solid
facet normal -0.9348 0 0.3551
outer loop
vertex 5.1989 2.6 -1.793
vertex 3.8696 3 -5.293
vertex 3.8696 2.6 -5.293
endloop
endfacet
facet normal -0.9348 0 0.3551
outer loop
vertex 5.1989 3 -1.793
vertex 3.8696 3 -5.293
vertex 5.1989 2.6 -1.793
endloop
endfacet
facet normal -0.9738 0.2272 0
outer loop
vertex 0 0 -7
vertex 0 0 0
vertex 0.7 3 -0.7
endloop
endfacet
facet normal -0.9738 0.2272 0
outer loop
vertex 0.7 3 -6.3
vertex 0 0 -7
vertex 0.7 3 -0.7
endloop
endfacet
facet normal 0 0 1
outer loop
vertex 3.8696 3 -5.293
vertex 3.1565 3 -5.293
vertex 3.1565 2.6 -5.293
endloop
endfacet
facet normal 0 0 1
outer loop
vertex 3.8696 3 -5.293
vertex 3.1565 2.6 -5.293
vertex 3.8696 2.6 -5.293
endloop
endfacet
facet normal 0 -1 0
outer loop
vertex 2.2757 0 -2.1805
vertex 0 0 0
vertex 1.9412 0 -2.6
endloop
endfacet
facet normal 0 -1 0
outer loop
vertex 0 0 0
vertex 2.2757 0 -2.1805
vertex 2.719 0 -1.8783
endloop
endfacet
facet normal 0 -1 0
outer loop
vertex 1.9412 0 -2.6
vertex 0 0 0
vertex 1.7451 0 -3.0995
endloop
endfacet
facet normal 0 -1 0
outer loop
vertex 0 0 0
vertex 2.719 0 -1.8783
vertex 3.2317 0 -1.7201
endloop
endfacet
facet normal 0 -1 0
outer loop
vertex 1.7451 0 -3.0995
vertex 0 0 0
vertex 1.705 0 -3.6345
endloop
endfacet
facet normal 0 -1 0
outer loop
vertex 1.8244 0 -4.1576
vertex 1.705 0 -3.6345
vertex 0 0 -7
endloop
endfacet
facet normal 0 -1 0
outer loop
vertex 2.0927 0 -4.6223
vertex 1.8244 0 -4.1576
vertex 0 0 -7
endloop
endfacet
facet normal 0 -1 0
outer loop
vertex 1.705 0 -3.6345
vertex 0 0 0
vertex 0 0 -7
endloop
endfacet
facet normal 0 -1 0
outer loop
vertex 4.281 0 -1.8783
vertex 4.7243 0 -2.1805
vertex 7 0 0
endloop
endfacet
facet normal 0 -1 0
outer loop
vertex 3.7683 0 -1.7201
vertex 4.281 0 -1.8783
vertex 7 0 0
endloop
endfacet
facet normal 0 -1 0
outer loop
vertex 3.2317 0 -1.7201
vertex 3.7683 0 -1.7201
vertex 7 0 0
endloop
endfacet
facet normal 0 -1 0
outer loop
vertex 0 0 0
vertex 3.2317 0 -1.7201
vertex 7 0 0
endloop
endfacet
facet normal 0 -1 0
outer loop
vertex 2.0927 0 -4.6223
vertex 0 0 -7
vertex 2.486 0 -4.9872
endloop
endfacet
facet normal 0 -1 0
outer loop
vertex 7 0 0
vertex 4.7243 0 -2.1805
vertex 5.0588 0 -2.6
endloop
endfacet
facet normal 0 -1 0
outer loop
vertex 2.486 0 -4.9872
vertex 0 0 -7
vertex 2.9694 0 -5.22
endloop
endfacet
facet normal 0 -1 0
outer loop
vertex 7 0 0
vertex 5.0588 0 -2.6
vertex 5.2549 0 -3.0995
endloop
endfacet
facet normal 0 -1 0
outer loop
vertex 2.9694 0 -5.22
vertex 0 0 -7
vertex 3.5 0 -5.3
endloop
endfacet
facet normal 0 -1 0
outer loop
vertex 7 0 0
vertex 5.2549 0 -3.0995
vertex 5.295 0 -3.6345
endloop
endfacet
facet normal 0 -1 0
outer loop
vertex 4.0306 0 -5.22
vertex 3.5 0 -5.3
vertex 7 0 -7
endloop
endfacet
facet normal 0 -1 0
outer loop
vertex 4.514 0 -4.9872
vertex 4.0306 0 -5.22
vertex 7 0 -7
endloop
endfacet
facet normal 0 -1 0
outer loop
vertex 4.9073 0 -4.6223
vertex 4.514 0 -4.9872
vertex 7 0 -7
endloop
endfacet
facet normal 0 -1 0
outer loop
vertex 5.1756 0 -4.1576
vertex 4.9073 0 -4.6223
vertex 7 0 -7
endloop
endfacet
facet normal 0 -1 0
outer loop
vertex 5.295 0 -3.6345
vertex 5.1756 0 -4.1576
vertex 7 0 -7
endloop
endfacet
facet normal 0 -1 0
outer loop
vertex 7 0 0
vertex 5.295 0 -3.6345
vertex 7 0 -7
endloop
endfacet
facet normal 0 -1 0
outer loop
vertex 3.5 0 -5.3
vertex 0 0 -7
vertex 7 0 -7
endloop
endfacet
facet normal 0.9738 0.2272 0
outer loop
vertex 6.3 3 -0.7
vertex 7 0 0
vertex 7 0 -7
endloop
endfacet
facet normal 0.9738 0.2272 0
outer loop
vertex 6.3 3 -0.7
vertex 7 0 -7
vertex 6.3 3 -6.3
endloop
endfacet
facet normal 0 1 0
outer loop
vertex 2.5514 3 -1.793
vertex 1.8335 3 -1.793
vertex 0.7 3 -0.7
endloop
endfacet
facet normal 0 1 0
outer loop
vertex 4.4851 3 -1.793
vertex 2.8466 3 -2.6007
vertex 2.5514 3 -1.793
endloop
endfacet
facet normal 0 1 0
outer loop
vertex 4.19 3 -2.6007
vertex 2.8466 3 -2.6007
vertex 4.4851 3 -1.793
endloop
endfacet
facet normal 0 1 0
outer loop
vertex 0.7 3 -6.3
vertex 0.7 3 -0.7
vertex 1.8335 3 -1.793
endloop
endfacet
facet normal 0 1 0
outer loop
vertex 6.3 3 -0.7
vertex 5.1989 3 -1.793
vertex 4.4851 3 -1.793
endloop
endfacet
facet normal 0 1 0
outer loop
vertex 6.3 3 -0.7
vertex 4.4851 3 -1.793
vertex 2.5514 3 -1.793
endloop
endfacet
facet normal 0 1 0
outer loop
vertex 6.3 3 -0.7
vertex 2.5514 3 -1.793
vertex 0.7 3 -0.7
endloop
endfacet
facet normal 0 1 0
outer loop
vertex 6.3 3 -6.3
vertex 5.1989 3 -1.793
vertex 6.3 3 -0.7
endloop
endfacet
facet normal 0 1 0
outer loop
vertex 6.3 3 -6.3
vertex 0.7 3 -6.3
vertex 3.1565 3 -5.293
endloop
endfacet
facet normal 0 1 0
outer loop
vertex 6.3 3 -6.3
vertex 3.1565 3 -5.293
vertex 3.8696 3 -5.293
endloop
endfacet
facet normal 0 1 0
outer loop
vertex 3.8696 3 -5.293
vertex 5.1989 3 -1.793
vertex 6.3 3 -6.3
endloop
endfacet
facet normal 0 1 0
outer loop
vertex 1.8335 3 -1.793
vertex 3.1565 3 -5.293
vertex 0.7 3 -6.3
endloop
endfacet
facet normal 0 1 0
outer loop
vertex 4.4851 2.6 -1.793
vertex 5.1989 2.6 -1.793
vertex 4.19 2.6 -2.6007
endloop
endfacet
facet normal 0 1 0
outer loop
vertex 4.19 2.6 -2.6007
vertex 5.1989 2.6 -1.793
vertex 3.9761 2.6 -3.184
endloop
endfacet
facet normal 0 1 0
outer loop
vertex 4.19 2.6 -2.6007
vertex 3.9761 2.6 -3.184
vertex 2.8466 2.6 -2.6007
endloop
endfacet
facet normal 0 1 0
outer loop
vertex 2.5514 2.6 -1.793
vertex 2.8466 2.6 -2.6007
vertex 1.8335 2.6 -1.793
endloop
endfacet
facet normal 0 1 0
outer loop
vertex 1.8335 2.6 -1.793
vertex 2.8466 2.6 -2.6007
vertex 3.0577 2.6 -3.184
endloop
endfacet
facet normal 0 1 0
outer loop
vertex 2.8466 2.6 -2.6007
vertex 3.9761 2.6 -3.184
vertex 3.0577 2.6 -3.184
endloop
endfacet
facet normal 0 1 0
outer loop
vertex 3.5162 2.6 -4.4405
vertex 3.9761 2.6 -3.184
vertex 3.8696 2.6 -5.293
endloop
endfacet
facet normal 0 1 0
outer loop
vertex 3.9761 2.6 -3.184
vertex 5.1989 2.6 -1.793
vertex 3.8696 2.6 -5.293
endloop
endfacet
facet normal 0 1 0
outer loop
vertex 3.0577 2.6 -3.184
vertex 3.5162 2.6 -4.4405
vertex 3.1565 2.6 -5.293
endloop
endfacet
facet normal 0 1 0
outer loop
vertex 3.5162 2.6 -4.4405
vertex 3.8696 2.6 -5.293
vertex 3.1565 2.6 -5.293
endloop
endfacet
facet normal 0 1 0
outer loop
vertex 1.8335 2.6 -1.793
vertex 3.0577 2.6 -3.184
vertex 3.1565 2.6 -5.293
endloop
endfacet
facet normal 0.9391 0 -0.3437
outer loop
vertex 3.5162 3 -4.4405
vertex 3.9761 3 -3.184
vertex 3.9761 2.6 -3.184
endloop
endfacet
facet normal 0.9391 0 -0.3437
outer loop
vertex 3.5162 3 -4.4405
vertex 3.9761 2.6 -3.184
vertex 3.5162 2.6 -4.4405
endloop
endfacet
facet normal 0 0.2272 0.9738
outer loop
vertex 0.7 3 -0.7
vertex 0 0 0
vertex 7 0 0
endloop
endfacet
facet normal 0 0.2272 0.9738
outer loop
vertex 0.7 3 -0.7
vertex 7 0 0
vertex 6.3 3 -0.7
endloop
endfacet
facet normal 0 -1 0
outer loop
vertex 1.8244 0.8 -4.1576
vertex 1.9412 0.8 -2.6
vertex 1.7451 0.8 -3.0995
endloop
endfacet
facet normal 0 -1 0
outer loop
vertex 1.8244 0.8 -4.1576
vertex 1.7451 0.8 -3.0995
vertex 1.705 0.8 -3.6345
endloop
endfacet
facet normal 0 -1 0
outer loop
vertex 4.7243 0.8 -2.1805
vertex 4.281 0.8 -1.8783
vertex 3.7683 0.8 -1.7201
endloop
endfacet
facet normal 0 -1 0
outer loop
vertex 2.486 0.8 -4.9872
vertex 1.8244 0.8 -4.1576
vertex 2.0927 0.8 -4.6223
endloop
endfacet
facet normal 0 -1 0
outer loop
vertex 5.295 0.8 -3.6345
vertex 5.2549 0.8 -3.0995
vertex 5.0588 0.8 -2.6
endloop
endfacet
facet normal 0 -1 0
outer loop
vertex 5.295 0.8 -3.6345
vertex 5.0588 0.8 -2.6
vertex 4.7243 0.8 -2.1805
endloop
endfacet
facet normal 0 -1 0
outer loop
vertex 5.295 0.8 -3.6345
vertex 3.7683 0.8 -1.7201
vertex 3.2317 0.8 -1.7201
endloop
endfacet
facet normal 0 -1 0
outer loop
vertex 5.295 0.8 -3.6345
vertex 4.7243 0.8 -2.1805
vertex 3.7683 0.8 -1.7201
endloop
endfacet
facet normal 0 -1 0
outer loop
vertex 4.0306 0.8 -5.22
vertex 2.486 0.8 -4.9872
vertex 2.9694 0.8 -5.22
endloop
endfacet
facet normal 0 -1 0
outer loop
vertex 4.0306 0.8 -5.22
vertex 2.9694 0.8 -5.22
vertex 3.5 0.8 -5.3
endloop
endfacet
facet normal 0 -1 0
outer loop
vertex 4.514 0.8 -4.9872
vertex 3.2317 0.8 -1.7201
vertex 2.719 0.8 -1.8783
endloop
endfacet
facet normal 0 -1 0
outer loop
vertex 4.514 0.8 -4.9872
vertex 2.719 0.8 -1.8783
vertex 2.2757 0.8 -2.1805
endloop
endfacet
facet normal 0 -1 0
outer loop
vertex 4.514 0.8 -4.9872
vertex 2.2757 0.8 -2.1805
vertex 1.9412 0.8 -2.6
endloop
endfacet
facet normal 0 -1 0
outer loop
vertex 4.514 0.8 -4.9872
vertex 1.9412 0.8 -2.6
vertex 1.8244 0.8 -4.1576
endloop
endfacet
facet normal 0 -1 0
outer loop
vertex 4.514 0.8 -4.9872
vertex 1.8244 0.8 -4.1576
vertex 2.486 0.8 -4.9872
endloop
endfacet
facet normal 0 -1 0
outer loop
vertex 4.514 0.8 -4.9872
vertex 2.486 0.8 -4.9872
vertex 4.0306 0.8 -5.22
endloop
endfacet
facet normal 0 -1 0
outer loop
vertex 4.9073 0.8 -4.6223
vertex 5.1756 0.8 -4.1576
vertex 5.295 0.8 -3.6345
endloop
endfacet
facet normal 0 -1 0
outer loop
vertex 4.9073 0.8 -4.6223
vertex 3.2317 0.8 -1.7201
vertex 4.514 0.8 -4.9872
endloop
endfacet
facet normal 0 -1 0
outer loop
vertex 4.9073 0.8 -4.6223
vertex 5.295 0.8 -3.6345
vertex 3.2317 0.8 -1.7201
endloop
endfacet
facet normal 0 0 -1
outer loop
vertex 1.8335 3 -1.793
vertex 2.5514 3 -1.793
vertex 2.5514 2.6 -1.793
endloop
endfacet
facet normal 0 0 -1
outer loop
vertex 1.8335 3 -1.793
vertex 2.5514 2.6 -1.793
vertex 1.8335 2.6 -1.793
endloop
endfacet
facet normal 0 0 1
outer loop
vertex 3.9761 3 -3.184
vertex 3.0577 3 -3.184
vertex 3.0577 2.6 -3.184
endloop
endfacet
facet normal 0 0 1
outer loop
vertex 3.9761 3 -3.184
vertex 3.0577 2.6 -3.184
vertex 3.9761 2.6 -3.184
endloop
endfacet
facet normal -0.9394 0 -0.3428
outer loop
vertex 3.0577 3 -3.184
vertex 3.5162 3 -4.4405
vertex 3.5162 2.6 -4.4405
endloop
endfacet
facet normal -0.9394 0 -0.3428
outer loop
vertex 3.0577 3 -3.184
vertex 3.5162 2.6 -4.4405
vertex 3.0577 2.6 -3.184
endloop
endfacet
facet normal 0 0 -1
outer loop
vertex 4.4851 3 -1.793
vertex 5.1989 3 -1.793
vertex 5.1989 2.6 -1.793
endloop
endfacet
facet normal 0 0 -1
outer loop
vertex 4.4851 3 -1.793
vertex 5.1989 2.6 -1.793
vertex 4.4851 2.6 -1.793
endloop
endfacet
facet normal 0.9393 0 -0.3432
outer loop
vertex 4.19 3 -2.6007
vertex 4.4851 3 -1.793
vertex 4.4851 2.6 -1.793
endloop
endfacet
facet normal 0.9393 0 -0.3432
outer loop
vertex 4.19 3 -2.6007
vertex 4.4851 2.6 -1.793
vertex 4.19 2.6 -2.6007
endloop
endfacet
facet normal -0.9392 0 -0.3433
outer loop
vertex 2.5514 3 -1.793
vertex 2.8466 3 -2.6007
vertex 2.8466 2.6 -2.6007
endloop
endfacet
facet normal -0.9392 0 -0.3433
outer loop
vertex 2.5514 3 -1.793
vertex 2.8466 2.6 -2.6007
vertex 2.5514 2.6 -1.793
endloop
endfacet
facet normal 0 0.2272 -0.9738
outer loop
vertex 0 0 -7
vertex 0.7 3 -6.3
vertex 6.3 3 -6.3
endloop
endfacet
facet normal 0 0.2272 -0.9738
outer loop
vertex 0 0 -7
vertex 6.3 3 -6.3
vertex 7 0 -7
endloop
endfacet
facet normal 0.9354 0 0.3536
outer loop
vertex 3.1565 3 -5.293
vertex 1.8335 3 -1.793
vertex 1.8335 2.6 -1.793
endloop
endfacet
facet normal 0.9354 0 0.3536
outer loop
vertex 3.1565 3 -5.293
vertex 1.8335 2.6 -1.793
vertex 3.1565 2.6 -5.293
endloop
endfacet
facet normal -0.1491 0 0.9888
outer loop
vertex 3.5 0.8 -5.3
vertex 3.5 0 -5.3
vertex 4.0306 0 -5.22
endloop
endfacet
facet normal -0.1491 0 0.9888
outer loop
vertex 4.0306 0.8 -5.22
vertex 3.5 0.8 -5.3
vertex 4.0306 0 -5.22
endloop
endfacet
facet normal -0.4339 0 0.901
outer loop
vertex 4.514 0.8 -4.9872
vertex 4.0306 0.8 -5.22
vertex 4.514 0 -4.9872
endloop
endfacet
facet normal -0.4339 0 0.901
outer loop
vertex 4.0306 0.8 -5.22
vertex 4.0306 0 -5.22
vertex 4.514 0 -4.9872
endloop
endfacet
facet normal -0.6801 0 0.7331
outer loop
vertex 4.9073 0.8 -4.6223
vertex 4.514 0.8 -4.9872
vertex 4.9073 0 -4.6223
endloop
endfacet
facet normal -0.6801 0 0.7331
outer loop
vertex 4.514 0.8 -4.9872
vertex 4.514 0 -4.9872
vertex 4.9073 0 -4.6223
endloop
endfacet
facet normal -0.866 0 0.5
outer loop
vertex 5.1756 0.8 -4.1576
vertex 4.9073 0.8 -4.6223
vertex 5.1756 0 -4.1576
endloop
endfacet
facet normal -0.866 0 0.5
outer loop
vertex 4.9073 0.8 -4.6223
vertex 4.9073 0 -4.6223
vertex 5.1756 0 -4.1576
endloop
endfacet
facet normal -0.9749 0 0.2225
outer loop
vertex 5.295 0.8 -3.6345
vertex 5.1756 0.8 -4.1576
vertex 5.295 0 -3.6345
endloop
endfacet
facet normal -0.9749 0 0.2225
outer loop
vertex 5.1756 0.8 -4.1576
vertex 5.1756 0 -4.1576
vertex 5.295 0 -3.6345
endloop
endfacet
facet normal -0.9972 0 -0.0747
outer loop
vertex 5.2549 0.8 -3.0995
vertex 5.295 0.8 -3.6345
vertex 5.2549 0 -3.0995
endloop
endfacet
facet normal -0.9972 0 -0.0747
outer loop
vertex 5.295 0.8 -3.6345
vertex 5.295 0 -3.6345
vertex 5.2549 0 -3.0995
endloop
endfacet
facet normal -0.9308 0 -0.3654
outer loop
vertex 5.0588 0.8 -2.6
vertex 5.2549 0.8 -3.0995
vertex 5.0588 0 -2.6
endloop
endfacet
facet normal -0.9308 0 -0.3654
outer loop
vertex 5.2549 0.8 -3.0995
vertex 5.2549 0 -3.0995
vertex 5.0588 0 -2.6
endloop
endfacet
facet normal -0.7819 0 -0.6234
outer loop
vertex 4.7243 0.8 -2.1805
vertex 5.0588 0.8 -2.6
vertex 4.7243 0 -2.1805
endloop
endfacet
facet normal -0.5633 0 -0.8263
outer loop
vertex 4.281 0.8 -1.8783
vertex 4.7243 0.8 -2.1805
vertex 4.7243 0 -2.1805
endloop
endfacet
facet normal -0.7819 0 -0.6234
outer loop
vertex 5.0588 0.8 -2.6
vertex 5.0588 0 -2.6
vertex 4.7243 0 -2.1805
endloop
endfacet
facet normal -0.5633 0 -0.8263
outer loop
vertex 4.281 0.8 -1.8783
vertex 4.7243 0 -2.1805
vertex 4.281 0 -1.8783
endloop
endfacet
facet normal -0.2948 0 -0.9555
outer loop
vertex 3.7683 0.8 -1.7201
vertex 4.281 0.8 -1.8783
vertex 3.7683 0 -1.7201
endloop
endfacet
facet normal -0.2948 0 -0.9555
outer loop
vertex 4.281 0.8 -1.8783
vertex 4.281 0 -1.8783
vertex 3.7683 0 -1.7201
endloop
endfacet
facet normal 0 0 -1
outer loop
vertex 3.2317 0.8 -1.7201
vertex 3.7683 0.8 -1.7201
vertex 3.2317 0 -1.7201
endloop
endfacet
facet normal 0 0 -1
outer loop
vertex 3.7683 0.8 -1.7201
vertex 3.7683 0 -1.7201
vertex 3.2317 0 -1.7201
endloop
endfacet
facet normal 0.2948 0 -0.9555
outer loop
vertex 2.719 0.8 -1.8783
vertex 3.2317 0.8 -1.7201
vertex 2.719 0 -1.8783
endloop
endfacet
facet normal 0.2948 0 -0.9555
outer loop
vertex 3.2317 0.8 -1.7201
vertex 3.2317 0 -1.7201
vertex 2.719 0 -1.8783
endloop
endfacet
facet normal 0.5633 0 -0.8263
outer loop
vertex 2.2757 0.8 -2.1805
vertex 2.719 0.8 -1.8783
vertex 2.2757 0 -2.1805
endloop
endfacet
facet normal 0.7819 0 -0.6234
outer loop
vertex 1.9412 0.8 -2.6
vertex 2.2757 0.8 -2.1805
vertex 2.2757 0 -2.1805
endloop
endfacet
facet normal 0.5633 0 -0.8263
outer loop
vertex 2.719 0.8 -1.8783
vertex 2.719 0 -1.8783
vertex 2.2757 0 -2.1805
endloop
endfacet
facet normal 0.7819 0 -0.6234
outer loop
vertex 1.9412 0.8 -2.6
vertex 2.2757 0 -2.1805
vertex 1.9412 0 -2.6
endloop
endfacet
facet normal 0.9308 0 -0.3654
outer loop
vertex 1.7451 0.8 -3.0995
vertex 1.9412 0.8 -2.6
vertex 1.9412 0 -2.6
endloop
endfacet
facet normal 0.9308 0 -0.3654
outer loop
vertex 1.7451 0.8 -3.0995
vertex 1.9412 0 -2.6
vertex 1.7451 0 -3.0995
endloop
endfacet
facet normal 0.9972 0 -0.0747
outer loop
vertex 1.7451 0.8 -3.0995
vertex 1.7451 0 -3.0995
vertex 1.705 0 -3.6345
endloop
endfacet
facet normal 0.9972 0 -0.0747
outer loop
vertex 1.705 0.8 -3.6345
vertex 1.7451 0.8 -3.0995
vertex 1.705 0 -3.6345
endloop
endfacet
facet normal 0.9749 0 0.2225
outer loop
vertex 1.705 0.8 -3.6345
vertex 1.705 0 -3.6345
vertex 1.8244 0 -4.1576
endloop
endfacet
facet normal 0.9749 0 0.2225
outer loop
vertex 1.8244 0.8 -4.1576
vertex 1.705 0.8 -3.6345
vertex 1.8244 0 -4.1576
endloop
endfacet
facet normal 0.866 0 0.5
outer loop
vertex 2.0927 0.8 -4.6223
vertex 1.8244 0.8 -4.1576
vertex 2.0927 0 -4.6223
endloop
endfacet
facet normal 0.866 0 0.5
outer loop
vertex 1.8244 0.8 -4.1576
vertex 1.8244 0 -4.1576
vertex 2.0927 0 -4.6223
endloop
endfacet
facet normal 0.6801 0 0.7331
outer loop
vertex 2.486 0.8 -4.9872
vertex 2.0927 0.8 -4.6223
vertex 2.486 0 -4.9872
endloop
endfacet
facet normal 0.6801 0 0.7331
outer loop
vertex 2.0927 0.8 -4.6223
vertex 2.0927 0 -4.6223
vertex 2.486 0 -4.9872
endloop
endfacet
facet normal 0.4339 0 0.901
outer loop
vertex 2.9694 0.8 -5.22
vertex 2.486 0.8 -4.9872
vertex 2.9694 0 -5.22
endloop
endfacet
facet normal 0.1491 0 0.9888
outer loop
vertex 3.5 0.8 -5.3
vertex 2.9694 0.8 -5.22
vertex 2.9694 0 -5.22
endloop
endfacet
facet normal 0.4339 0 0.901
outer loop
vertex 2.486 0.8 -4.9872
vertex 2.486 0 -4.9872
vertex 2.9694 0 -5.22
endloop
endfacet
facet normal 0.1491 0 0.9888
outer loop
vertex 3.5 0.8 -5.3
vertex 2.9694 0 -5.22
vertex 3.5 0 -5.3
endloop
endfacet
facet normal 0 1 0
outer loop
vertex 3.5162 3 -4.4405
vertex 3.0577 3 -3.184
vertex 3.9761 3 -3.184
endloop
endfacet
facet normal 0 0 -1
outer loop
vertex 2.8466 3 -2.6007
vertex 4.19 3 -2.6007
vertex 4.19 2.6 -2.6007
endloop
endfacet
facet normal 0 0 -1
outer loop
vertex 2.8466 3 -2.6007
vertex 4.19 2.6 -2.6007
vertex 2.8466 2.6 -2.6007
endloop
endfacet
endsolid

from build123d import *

# Parameters (mm, degrees)
SKETCH1_W           = 7
SKETCH1_H           = 7
BOSS_EXTRUDE1_DEPTH = 3
CUT_EXTRUDE1_DEPTH  = 7
CUT_EXTRUDE2_DEPTH  = 11
SKETCH4_R           = 1.8
CUT_EXTRUDE3_DEPTH  = 0.8
CUT_EXTRUDE4_DEPTH  = 0.4


with BuildPart() as part:
    # Sketch1 → Boss-Extrude1 (new body)
    with BuildSketch(Plane(origin=(0, 0, 0), x_dir=(1, 0, 0), z_dir=(0, 1, 0))):
        with Locations((3.5, 3.5)):
            Rectangle(SKETCH1_W, SKETCH1_H)
    extrude(amount=BOSS_EXTRUDE1_DEPTH)

    # Sketch2 → Cut-Extrude1 (cut)
    with BuildSketch(Plane.XY):
        Polygon((0, 0), (0.7, 3), (0, 3), align=None)
        Polygon((7, 0), (6.3, 3), (7, 3), align=None)
    extrude(amount=-CUT_EXTRUDE1_DEPTH, mode=Mode.SUBTRACT)

    # Sketch3 → Cut-Extrude2 (cut)
    with BuildSketch(Plane(origin=(0, 0, 0), x_dir=(0, 0, -1), z_dir=(1, 0, 0))):
        Polygon((0, 0), (0.7, 3), (0, 3), align=None)
        Polygon((7, 3), (6.3, 3), (7, 0), align=None)
    extrude(amount=CUT_EXTRUDE2_DEPTH, mode=Mode.SUBTRACT)

    # Sketch4 → Cut-Extrude3 (cut)
    with BuildSketch(Plane.XZ):
        with Locations(Location((3.5, -3.5, 0), (0, 0, 270))):
            Circle(SKETCH4_R)
    extrude(amount=-CUT_EXTRUDE3_DEPTH, mode=Mode.SUBTRACT)

    # Sketch5 → Cut-Extrude4 (cut)
    with BuildSketch(Plane(origin=(0, 3, 0), x_dir=(1, 0, 0), z_dir=(0, 1, 0))):
        Polygon((5.198883611, 1.79301719), (4.485141624, 1.79301719), (4.189969348, 2.600709497), (2.846619989, 2.600709497), (2.551447713, 1.79301719), (1.833498995, 1.79301719), (3.156515822, 5.29301719), (3.869556688, 5.29301719), align=None)
        Polygon((3.976127201, 3.184042831), (3.516191303, 4.440453087), (3.057657649, 3.184042831), align=None, mode=Mode.SUBTRACT)
    extrude(amount=-CUT_EXTRUDE4_DEPTH, mode=Mode.SUBTRACT)


solid = part.part
